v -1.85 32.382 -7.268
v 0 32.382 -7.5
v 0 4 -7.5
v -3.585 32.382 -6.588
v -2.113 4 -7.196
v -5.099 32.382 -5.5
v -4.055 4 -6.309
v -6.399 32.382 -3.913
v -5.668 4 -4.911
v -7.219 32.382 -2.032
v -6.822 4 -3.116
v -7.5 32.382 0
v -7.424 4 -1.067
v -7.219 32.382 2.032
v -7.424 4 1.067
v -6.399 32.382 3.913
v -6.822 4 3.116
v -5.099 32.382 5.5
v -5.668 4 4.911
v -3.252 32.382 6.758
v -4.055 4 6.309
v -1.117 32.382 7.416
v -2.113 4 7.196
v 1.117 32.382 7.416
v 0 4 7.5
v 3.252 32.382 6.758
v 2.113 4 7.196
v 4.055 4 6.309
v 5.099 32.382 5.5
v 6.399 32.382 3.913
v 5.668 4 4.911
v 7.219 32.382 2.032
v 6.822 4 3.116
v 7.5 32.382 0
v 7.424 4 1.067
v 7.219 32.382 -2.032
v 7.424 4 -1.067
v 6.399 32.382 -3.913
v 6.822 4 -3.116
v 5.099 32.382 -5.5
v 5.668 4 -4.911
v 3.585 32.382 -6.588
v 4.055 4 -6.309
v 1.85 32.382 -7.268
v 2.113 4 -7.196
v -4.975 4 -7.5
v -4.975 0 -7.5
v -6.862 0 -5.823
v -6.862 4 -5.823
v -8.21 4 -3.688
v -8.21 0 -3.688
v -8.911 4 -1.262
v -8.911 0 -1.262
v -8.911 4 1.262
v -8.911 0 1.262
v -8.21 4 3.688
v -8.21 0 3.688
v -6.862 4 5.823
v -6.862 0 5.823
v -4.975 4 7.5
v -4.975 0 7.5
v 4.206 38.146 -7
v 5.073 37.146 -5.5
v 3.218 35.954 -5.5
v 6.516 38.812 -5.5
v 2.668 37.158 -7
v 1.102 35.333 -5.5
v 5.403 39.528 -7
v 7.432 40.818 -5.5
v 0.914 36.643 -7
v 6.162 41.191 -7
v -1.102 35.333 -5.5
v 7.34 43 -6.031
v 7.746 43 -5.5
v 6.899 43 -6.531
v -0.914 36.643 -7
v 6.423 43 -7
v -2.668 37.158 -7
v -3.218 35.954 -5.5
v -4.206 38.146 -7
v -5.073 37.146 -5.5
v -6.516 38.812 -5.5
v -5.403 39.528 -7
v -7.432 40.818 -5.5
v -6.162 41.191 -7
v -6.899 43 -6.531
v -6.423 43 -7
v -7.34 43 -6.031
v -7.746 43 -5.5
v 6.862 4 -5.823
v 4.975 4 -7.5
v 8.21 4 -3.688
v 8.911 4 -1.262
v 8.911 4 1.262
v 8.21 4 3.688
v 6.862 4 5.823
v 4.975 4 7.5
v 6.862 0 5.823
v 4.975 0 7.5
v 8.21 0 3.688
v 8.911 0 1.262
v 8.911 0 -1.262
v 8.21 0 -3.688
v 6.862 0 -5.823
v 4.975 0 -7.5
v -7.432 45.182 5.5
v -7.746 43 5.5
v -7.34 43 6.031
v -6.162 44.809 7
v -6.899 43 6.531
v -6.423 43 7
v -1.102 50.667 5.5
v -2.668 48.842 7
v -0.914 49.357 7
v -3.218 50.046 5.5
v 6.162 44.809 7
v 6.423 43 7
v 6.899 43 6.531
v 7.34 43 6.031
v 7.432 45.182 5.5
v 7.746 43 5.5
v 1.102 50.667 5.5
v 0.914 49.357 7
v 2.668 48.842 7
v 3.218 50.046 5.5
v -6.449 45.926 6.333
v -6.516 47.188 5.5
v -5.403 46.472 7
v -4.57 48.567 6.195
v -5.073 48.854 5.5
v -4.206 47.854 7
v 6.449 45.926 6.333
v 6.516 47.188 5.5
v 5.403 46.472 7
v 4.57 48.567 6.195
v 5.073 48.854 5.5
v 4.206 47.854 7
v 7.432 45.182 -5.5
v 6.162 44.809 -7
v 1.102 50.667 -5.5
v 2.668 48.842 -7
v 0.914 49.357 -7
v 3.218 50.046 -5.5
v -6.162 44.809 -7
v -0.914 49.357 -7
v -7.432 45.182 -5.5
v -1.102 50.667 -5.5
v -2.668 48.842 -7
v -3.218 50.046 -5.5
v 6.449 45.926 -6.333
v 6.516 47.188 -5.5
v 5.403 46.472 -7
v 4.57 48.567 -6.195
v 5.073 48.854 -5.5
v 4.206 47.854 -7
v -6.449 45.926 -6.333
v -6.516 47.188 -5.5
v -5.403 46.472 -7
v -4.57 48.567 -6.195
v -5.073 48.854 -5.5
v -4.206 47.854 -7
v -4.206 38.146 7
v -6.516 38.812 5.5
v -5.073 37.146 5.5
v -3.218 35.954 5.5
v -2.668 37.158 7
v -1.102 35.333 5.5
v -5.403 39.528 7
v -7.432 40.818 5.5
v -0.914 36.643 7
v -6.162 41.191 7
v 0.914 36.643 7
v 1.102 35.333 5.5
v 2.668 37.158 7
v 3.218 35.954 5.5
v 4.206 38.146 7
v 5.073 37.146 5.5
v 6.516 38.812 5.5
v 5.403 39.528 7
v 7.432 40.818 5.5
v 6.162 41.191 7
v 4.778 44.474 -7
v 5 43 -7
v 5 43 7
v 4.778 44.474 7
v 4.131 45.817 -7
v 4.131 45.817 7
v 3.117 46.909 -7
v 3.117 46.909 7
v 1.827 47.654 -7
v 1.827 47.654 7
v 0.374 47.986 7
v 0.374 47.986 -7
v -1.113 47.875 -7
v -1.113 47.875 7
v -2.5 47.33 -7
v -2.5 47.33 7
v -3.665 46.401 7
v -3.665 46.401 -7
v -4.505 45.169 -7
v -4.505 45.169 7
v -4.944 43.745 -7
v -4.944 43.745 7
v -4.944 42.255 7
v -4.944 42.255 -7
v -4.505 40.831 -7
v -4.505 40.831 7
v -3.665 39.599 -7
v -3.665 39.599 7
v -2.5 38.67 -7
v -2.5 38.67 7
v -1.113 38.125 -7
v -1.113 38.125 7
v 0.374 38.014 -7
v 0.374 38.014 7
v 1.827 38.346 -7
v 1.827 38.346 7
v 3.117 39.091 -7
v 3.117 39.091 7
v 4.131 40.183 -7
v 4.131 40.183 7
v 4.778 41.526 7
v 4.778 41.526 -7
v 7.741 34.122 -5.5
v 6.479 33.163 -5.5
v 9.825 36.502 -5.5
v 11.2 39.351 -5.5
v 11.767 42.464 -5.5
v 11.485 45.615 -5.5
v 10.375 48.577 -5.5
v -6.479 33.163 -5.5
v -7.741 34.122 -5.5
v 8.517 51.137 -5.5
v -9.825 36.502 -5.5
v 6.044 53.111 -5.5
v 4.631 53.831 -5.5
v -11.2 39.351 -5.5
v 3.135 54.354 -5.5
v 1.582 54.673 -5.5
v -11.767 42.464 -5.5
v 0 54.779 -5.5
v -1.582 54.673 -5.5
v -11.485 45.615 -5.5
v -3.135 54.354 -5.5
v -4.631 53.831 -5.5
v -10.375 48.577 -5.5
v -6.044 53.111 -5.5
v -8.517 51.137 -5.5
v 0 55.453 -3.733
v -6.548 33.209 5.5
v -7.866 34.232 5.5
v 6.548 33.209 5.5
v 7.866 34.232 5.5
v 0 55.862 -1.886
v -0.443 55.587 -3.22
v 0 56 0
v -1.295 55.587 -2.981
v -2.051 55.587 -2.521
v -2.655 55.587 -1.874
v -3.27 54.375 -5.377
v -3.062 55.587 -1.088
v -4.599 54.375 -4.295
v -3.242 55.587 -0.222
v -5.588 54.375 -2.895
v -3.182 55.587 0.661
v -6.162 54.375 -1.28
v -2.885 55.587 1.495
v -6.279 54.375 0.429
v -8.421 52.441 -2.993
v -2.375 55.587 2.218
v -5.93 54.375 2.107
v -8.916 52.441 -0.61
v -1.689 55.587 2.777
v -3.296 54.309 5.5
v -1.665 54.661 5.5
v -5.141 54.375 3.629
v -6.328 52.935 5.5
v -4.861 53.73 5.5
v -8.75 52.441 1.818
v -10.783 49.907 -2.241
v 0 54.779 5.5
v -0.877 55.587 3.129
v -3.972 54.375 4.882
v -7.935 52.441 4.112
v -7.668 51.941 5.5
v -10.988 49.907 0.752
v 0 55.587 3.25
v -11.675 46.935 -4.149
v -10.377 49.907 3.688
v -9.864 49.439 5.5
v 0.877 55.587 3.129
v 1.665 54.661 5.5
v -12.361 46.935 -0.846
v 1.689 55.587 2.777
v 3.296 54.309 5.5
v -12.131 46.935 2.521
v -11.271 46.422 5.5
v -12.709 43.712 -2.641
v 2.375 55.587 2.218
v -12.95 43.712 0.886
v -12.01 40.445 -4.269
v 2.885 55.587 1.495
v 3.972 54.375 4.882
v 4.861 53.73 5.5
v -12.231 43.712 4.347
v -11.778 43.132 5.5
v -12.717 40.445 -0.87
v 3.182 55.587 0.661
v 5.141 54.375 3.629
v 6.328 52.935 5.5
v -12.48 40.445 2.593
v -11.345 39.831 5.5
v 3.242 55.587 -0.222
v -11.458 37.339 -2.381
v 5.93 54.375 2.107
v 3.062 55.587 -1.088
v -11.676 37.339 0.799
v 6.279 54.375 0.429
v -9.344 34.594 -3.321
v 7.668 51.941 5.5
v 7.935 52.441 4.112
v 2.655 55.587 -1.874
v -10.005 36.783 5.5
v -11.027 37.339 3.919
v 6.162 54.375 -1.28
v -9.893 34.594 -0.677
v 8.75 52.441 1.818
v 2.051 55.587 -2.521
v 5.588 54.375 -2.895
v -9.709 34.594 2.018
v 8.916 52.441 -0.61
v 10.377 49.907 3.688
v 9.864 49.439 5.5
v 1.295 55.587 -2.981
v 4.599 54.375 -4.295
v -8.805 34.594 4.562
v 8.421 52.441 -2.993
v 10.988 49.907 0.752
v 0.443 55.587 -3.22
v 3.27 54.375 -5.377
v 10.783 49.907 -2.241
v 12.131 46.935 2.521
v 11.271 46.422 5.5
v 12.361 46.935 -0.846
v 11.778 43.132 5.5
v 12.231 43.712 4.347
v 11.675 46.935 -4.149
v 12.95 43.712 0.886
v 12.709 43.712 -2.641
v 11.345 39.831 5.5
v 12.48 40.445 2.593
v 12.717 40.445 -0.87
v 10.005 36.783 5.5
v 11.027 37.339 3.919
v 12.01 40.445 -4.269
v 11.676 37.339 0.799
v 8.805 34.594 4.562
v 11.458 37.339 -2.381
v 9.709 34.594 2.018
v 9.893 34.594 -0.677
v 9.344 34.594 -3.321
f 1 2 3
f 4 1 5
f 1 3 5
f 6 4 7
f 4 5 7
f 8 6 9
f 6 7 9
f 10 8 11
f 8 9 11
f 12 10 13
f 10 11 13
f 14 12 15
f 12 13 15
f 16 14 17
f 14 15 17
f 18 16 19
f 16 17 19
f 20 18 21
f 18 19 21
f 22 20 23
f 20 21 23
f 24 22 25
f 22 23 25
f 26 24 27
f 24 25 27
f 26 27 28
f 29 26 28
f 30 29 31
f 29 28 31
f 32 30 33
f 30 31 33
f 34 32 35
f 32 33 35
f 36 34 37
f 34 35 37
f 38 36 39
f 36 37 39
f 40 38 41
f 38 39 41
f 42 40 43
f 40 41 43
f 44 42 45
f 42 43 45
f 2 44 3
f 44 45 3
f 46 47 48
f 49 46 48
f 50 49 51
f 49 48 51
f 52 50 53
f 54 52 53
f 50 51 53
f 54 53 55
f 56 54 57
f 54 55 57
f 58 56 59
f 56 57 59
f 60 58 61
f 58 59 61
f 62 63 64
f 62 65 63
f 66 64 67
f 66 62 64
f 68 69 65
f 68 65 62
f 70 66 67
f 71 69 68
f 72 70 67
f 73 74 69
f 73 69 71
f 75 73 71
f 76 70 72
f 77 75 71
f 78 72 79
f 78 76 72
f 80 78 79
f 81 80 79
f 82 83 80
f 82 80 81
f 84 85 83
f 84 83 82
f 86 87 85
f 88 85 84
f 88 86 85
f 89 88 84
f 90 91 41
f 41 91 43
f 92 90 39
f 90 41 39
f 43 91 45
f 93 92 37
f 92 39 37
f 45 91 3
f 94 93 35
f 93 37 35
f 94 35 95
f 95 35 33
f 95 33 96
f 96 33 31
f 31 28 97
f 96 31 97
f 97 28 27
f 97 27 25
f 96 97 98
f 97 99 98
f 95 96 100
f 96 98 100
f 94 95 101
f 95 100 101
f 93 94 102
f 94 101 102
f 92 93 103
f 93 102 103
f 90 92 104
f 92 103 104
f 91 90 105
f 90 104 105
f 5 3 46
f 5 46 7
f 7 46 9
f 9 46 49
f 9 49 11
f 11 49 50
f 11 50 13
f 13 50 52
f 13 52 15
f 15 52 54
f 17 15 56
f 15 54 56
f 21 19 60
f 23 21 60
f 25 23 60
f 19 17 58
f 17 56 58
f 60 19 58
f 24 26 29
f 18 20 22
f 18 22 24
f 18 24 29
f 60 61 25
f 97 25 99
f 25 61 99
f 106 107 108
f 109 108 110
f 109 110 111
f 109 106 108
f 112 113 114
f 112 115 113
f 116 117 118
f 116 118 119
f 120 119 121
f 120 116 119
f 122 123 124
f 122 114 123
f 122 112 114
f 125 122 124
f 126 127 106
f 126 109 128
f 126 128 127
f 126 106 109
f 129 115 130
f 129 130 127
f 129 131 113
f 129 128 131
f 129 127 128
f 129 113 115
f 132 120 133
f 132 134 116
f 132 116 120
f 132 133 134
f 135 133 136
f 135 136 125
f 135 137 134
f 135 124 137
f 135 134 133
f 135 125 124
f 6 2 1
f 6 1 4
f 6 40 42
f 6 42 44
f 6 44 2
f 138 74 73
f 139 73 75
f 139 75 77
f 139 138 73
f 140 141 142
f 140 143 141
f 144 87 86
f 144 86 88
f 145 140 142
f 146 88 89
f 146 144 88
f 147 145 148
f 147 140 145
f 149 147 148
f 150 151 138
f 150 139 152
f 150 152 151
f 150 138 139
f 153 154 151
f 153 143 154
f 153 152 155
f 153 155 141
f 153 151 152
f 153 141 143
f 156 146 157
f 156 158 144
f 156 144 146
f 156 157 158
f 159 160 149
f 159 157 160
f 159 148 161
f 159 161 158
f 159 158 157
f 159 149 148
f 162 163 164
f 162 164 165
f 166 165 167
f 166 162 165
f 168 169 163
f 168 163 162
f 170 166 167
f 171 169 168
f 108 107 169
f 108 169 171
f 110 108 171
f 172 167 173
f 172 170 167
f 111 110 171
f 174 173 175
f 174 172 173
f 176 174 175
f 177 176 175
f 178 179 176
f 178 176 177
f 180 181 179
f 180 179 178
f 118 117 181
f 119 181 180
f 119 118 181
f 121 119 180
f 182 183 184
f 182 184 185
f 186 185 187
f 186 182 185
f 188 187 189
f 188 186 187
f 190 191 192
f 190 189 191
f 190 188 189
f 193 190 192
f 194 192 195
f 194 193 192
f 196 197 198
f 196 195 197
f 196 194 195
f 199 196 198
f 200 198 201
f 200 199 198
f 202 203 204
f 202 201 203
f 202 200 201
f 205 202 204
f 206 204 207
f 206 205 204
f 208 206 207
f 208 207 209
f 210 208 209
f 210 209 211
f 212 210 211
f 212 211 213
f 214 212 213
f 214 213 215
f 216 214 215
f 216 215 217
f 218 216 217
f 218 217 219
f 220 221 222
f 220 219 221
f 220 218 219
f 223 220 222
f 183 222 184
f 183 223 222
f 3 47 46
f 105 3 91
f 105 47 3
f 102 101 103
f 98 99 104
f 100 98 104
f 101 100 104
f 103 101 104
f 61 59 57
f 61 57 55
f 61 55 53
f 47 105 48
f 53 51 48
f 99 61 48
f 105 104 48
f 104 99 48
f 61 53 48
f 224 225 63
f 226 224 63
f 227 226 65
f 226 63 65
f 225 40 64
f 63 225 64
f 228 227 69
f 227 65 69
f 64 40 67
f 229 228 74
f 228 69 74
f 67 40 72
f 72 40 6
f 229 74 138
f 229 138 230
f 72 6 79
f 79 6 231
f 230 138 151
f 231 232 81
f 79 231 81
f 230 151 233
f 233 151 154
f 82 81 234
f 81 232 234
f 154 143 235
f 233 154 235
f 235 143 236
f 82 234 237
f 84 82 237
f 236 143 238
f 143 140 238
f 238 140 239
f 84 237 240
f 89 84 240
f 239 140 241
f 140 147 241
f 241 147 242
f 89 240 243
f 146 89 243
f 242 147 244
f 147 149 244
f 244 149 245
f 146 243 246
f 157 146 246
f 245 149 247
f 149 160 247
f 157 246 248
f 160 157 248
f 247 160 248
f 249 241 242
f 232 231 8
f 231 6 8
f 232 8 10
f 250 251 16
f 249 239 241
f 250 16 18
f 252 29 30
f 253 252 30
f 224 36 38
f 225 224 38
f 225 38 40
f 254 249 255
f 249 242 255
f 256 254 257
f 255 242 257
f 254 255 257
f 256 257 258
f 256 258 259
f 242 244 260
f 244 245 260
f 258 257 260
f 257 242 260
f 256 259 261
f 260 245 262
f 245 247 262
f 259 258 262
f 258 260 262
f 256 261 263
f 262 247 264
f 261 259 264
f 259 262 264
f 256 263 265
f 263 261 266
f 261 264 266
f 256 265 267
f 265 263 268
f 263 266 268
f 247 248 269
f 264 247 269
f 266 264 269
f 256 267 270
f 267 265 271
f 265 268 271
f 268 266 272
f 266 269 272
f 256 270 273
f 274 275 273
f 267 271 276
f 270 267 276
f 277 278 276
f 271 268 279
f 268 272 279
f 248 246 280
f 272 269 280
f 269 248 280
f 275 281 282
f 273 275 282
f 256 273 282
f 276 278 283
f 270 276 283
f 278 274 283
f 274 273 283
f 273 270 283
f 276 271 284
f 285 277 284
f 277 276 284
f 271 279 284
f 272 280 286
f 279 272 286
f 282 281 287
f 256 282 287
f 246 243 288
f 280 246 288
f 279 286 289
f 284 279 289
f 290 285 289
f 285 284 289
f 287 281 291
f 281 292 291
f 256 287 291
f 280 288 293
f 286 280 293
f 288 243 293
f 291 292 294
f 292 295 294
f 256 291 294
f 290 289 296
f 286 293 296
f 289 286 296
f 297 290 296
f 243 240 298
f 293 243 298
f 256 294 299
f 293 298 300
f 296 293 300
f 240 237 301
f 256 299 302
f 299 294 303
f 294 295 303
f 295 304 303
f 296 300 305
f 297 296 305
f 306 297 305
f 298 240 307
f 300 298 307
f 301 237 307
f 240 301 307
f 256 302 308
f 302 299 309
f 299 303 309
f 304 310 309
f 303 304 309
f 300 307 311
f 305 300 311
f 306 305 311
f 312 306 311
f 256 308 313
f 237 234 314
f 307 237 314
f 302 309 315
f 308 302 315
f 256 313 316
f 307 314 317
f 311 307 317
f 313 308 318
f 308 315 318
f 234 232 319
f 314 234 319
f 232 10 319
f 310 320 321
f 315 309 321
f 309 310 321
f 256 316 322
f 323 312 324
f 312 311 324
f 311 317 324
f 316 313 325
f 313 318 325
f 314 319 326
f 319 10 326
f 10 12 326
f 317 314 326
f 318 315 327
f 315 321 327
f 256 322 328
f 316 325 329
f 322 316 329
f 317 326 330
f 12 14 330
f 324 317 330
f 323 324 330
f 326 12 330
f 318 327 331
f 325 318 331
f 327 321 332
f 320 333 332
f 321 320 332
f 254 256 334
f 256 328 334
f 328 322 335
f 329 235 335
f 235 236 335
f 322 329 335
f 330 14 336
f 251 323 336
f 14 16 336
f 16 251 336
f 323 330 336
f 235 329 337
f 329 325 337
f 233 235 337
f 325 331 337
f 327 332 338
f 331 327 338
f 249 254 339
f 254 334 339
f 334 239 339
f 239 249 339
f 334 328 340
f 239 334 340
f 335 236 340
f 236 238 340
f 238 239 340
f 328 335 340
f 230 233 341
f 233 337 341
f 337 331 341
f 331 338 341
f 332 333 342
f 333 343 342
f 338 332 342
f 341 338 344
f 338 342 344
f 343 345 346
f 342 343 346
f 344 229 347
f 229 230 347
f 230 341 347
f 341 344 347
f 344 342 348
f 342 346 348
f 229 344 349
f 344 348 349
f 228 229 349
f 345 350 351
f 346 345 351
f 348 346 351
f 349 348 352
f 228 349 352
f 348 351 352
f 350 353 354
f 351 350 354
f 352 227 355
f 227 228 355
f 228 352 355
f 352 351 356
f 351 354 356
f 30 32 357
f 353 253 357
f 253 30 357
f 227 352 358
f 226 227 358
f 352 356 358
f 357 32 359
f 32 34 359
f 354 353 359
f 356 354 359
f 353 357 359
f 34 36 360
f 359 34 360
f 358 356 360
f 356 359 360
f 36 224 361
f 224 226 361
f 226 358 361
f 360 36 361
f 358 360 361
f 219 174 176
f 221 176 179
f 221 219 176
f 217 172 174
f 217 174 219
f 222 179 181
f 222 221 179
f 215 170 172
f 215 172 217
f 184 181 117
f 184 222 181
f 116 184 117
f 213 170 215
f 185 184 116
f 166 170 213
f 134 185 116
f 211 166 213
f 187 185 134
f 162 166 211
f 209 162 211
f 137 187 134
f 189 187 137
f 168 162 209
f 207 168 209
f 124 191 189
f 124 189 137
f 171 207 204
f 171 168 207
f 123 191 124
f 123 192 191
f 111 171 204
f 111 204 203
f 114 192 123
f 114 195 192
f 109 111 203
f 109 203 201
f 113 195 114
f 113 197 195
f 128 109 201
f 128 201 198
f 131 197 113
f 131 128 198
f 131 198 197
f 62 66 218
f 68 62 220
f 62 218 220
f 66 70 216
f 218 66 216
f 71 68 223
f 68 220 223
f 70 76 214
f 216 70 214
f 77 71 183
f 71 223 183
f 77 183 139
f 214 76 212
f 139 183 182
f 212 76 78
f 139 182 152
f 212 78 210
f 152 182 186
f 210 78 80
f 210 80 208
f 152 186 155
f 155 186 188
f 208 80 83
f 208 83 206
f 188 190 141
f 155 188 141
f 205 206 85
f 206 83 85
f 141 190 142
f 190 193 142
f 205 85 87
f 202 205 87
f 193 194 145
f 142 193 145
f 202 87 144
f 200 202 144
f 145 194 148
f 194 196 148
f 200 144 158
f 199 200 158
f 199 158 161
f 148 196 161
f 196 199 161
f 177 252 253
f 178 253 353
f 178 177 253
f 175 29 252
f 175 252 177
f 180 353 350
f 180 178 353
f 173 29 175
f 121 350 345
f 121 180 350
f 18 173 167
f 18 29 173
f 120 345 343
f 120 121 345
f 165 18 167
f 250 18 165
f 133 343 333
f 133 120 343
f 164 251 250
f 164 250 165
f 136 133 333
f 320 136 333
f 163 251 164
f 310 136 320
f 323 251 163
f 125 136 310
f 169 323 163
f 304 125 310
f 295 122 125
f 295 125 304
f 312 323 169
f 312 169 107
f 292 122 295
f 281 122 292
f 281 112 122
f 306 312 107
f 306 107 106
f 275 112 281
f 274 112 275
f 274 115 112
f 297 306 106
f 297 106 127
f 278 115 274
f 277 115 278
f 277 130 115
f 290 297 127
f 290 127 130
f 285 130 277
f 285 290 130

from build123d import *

# Parameters (mm, degrees)
CUT_EXTRUDE3_DEPTH      = 59.940648113
CUT_EXTRUDE3_DEPTH_BACK = 59.940648113
SKETCH3_W               = 17.579289035
SKETCH3_H               = 30.509322749
CUT_EXTRUDE4_DEPTH      = 59.268773799
CUT_EXTRUDE4_DEPTH_BACK = 59.268773799
SKETCH4_W               = 14.932737824
SKETCH4_H               = 19.875765969
CUT_EXTRUDE5_DEPTH      = 60.674114991
CUT_EXTRUDE5_DEPTH_BACK = 60.674114991
SKETCH5_R               = 5
CUT_EXTRUDE6_DEPTH      = 59.189346104
CUT_EXTRUDE6_DEPTH_BACK = 59.189346104
SKETCH6_W               = 15.994671042
SKETCH6_H               = 5.292782054


with BuildPart() as part:
    # Sketch1 → Revolve5 (revolve)
    with BuildSketch(Plane.XY):
        with BuildLine():
            Line((0, 52.5), (0, 53.5))
            ThreePointArc((0, 53.5), (-10.5, 43), (0, 32.5))
            Line((0, 32.5), (0, 33.5))
            ThreePointArc((0, 33.5), (-9.5, 43), (0, 52.5))
        make_face()
    revolve(axis=Axis((0, 0, 0), (0, 1, 0)))

    # Sketch1<7> → Revolve6 (revolve)
    with BuildSketch(Plane.XY):
        with BuildLine():
            Line((-7.5, 32.381619709), (-7.5, 4))
            Line((-7.5, 4), (-9, 4))
            Line((-9, 4), (-9, 0))
            Line((-9, 0), (0, 0))
            Line((0, 0), (0, 32.5))
            ThreePointArc((0, 32.5), (-10.5, 43), (0, 53.5))
            Line((0, 53.5), (0, 56))
            ThreePointArc((0, 56), (-12.39029749, 46.934530227), (-7.5, 32.381619709))
        make_face()
    revolve(axis=Axis((0, 0, 0), (0, 1, 0)))

    # Sketch3 → Cut-Extrude3 (cut, two sides: drawn at the far end of the back side and taken through both)
    with BuildSketch(Plane(origin=(0, 0, 0), x_dir=(0, 0, -1), z_dir=(1, 0, 0)).offset(-CUT_EXTRUDE3_DEPTH_BACK)):
        with Locations((-14.289644518, 47.636281084)):
            Rectangle(SKETCH3_W, SKETCH3_H)
        with Locations((14.289644518, 47.636281084)):
            Rectangle(SKETCH3_W, SKETCH3_H)
    extrude(amount=CUT_EXTRUDE3_DEPTH + CUT_EXTRUDE3_DEPTH_BACK, mode=Mode.SUBTRACT)

    # Sketch1<8> → Revolve7 (revolve)
    with BuildSketch(Plane.XY):
        with BuildLine():
            Line((0, 33.5), (0, 52.5))
            ThreePointArc((0, 52.5), (-9.5, 43), (0, 33.5))
        make_face()
    revolve(axis=Axis((0, 0, 0), (0, 1, 0)))

    # Sketch4 → Cut-Extrude4 (cut, two sides: drawn at the far end of the back side and taken through both)
    with BuildSketch(Plane(origin=(0, 0, 0), x_dir=(0, 0, -1), z_dir=(1, 0, 0)).offset(-CUT_EXTRUDE4_DEPTH_BACK)):
        with Locations((-14.466368912, 45.402031304)):
            Rectangle(SKETCH4_W, SKETCH4_H)
        with Locations((14.466368912, 45.402031304)):
            Rectangle(SKETCH4_W, SKETCH4_H)
    extrude(amount=CUT_EXTRUDE4_DEPTH + CUT_EXTRUDE4_DEPTH_BACK, mode=Mode.SUBTRACT)

    # Sketch5 → Cut-Extrude5 (cut, two sides: drawn at the far end of the back side and taken through both)
    with BuildSketch(Plane.XY.offset(7).offset(-CUT_EXTRUDE5_DEPTH_BACK)):
        with Locations((0, 43)):
            Circle(SKETCH5_R)
    extrude(amount=CUT_EXTRUDE5_DEPTH + CUT_EXTRUDE5_DEPTH_BACK, mode=Mode.SUBTRACT)

    # Sketch6 → Cut-Extrude6 (cut, two sides: drawn at the far end of the back side and taken through both)
    with BuildSketch(Plane(origin=(0, 0, 0), x_dir=(1, 0, 0), z_dir=(0, 1, 0)).offset(-CUT_EXTRUDE6_DEPTH_BACK)):
        with Locations((0.436218301, 10.146391027)):
            Rectangle(SKETCH6_W, SKETCH6_H)
        with Locations((0.436218301, -10.146391027)):
            Rectangle(SKETCH6_W, SKETCH6_H)
    extrude(amount=CUT_EXTRUDE6_DEPTH + CUT_EXTRUDE6_DEPTH_BACK, mode=Mode.SUBTRACT)


solid = part.part
